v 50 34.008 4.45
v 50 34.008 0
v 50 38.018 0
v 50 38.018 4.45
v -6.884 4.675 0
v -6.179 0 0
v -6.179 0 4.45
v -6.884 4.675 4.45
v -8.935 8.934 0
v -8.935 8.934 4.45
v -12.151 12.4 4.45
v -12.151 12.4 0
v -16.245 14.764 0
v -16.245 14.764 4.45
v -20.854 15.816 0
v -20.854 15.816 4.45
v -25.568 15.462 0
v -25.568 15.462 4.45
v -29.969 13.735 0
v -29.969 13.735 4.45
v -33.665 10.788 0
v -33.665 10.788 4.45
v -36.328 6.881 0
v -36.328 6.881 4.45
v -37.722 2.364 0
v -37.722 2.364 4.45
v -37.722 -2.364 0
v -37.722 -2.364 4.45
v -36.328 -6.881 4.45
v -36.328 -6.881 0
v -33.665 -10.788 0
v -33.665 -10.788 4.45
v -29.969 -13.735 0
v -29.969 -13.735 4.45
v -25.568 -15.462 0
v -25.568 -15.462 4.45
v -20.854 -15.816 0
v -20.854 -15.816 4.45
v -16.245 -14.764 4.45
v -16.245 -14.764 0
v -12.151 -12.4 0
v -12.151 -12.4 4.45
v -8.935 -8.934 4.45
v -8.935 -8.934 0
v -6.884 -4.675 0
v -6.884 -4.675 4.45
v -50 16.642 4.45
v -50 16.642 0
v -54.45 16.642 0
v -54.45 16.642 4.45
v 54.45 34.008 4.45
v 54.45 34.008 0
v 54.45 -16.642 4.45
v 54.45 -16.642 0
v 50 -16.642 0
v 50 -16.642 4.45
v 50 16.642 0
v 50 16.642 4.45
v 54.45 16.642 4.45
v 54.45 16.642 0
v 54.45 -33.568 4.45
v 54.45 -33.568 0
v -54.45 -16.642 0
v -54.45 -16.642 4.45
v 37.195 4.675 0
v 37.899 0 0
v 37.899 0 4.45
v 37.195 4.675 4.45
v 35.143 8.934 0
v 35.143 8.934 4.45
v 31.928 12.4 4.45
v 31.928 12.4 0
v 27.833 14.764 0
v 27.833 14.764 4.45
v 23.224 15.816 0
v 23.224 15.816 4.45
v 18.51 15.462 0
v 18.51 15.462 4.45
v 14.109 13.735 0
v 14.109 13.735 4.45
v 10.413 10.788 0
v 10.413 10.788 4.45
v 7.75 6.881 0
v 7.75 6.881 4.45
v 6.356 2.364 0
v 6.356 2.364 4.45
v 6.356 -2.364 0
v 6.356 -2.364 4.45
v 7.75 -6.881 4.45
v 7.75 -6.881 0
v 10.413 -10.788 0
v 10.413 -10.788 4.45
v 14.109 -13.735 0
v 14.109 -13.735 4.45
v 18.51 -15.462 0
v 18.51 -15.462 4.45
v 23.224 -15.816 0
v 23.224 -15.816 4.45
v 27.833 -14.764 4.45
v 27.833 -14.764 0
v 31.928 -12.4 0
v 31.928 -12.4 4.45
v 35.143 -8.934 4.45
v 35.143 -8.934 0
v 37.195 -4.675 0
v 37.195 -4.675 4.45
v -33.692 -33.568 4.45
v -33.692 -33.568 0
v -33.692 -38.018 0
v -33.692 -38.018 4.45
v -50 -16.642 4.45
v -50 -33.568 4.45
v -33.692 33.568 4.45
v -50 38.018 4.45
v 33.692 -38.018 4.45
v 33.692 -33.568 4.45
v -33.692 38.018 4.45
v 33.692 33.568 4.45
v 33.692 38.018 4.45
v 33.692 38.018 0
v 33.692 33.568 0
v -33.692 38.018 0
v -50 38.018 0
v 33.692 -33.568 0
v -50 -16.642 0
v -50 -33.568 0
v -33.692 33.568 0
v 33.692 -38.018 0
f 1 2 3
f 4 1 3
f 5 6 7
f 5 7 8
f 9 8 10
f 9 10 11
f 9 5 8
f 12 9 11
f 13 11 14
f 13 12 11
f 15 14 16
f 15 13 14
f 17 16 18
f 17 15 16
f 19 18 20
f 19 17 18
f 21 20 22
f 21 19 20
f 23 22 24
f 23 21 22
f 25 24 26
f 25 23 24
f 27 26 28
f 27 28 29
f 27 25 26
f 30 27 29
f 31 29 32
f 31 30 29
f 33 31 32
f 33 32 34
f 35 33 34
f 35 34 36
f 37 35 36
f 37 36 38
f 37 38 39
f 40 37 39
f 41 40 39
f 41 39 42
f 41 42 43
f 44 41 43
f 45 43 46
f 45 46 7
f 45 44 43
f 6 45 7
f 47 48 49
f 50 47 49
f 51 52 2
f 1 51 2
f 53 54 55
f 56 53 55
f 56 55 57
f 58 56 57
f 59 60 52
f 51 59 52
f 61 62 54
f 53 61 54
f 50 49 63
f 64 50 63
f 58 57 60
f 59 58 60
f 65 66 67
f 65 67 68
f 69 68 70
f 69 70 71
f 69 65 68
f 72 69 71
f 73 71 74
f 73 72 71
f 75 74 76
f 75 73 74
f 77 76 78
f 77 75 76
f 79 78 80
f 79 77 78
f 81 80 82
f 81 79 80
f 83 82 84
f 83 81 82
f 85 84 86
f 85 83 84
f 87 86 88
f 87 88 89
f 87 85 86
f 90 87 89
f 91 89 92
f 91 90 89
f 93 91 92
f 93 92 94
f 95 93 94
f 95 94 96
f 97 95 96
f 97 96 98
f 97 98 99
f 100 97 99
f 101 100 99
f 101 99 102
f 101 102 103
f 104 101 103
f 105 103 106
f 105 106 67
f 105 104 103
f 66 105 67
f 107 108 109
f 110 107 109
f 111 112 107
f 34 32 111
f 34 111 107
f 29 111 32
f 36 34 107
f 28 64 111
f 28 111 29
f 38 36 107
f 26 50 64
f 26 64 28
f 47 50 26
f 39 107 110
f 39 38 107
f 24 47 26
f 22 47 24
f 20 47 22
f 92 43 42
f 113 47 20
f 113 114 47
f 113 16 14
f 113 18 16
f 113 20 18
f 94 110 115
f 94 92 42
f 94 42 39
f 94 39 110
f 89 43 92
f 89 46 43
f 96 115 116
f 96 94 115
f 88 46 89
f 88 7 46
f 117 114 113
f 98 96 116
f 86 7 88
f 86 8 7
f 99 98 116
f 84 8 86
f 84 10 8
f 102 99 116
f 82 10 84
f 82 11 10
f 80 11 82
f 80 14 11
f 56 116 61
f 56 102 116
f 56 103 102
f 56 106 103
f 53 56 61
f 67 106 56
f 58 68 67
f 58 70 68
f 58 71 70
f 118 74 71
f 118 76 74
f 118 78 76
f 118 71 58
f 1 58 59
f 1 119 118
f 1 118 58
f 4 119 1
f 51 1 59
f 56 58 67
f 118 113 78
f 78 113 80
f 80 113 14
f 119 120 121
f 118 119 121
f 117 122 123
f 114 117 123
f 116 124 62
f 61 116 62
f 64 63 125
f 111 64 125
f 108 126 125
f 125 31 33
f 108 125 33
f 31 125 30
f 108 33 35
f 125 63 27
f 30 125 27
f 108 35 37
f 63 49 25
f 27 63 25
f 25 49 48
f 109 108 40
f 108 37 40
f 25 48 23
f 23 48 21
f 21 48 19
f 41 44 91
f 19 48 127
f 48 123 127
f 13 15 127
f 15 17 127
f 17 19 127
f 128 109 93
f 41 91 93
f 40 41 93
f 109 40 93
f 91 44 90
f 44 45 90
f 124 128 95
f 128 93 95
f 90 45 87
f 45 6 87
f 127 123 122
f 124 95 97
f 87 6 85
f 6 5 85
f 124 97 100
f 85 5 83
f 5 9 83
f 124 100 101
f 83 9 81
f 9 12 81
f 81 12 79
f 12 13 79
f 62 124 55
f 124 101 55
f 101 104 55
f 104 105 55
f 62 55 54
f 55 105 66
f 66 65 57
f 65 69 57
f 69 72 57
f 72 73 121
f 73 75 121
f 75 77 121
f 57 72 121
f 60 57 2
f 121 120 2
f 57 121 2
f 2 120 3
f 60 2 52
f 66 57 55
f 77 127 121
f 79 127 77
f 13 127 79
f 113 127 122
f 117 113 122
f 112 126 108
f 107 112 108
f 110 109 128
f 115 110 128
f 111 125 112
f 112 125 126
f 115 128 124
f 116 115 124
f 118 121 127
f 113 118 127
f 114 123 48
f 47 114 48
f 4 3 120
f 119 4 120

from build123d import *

# Parameters (mm, degrees)
F0_R     = 15.86
F1_DEPTH = 4.45


with BuildPart() as f1:
    # F0 (on Top) → F1 (new body)
    with BuildSketch(Plane.XY):
        Polygon((33.6925, -33.5685), (50, -33.5685), (54.45, -33.5685), (54.45, -16.64242), (50, -16.64242), (50, 16.64242), (54.45, 16.64242), (54.45, 34.008425), (50, 34.008425), (50, 38.0185), (33.6925, 38.0185), (33.6925, 33.5685), (-33.6925, 33.5685), (-33.6925, 38.0185), (-50, 38.0185), (-50, 33.5685), (-50, 16.64242), (-54.45, 16.64242), (-54.45, -16.64242), (-50, -16.64242), (-50, -33.5685), (-33.6925, -33.5685), (-33.6925, -38.0185), (33.6925, -38.0185), align=None)
        with Locations((-22.039123, 0)):
            Circle(F0_R, mode=Mode.SUBTRACT)
        with Locations((22.039123, 0)):
            Circle(F0_R, mode=Mode.SUBTRACT)
    extrude(amount=F1_DEPTH)


solid = f1.part
